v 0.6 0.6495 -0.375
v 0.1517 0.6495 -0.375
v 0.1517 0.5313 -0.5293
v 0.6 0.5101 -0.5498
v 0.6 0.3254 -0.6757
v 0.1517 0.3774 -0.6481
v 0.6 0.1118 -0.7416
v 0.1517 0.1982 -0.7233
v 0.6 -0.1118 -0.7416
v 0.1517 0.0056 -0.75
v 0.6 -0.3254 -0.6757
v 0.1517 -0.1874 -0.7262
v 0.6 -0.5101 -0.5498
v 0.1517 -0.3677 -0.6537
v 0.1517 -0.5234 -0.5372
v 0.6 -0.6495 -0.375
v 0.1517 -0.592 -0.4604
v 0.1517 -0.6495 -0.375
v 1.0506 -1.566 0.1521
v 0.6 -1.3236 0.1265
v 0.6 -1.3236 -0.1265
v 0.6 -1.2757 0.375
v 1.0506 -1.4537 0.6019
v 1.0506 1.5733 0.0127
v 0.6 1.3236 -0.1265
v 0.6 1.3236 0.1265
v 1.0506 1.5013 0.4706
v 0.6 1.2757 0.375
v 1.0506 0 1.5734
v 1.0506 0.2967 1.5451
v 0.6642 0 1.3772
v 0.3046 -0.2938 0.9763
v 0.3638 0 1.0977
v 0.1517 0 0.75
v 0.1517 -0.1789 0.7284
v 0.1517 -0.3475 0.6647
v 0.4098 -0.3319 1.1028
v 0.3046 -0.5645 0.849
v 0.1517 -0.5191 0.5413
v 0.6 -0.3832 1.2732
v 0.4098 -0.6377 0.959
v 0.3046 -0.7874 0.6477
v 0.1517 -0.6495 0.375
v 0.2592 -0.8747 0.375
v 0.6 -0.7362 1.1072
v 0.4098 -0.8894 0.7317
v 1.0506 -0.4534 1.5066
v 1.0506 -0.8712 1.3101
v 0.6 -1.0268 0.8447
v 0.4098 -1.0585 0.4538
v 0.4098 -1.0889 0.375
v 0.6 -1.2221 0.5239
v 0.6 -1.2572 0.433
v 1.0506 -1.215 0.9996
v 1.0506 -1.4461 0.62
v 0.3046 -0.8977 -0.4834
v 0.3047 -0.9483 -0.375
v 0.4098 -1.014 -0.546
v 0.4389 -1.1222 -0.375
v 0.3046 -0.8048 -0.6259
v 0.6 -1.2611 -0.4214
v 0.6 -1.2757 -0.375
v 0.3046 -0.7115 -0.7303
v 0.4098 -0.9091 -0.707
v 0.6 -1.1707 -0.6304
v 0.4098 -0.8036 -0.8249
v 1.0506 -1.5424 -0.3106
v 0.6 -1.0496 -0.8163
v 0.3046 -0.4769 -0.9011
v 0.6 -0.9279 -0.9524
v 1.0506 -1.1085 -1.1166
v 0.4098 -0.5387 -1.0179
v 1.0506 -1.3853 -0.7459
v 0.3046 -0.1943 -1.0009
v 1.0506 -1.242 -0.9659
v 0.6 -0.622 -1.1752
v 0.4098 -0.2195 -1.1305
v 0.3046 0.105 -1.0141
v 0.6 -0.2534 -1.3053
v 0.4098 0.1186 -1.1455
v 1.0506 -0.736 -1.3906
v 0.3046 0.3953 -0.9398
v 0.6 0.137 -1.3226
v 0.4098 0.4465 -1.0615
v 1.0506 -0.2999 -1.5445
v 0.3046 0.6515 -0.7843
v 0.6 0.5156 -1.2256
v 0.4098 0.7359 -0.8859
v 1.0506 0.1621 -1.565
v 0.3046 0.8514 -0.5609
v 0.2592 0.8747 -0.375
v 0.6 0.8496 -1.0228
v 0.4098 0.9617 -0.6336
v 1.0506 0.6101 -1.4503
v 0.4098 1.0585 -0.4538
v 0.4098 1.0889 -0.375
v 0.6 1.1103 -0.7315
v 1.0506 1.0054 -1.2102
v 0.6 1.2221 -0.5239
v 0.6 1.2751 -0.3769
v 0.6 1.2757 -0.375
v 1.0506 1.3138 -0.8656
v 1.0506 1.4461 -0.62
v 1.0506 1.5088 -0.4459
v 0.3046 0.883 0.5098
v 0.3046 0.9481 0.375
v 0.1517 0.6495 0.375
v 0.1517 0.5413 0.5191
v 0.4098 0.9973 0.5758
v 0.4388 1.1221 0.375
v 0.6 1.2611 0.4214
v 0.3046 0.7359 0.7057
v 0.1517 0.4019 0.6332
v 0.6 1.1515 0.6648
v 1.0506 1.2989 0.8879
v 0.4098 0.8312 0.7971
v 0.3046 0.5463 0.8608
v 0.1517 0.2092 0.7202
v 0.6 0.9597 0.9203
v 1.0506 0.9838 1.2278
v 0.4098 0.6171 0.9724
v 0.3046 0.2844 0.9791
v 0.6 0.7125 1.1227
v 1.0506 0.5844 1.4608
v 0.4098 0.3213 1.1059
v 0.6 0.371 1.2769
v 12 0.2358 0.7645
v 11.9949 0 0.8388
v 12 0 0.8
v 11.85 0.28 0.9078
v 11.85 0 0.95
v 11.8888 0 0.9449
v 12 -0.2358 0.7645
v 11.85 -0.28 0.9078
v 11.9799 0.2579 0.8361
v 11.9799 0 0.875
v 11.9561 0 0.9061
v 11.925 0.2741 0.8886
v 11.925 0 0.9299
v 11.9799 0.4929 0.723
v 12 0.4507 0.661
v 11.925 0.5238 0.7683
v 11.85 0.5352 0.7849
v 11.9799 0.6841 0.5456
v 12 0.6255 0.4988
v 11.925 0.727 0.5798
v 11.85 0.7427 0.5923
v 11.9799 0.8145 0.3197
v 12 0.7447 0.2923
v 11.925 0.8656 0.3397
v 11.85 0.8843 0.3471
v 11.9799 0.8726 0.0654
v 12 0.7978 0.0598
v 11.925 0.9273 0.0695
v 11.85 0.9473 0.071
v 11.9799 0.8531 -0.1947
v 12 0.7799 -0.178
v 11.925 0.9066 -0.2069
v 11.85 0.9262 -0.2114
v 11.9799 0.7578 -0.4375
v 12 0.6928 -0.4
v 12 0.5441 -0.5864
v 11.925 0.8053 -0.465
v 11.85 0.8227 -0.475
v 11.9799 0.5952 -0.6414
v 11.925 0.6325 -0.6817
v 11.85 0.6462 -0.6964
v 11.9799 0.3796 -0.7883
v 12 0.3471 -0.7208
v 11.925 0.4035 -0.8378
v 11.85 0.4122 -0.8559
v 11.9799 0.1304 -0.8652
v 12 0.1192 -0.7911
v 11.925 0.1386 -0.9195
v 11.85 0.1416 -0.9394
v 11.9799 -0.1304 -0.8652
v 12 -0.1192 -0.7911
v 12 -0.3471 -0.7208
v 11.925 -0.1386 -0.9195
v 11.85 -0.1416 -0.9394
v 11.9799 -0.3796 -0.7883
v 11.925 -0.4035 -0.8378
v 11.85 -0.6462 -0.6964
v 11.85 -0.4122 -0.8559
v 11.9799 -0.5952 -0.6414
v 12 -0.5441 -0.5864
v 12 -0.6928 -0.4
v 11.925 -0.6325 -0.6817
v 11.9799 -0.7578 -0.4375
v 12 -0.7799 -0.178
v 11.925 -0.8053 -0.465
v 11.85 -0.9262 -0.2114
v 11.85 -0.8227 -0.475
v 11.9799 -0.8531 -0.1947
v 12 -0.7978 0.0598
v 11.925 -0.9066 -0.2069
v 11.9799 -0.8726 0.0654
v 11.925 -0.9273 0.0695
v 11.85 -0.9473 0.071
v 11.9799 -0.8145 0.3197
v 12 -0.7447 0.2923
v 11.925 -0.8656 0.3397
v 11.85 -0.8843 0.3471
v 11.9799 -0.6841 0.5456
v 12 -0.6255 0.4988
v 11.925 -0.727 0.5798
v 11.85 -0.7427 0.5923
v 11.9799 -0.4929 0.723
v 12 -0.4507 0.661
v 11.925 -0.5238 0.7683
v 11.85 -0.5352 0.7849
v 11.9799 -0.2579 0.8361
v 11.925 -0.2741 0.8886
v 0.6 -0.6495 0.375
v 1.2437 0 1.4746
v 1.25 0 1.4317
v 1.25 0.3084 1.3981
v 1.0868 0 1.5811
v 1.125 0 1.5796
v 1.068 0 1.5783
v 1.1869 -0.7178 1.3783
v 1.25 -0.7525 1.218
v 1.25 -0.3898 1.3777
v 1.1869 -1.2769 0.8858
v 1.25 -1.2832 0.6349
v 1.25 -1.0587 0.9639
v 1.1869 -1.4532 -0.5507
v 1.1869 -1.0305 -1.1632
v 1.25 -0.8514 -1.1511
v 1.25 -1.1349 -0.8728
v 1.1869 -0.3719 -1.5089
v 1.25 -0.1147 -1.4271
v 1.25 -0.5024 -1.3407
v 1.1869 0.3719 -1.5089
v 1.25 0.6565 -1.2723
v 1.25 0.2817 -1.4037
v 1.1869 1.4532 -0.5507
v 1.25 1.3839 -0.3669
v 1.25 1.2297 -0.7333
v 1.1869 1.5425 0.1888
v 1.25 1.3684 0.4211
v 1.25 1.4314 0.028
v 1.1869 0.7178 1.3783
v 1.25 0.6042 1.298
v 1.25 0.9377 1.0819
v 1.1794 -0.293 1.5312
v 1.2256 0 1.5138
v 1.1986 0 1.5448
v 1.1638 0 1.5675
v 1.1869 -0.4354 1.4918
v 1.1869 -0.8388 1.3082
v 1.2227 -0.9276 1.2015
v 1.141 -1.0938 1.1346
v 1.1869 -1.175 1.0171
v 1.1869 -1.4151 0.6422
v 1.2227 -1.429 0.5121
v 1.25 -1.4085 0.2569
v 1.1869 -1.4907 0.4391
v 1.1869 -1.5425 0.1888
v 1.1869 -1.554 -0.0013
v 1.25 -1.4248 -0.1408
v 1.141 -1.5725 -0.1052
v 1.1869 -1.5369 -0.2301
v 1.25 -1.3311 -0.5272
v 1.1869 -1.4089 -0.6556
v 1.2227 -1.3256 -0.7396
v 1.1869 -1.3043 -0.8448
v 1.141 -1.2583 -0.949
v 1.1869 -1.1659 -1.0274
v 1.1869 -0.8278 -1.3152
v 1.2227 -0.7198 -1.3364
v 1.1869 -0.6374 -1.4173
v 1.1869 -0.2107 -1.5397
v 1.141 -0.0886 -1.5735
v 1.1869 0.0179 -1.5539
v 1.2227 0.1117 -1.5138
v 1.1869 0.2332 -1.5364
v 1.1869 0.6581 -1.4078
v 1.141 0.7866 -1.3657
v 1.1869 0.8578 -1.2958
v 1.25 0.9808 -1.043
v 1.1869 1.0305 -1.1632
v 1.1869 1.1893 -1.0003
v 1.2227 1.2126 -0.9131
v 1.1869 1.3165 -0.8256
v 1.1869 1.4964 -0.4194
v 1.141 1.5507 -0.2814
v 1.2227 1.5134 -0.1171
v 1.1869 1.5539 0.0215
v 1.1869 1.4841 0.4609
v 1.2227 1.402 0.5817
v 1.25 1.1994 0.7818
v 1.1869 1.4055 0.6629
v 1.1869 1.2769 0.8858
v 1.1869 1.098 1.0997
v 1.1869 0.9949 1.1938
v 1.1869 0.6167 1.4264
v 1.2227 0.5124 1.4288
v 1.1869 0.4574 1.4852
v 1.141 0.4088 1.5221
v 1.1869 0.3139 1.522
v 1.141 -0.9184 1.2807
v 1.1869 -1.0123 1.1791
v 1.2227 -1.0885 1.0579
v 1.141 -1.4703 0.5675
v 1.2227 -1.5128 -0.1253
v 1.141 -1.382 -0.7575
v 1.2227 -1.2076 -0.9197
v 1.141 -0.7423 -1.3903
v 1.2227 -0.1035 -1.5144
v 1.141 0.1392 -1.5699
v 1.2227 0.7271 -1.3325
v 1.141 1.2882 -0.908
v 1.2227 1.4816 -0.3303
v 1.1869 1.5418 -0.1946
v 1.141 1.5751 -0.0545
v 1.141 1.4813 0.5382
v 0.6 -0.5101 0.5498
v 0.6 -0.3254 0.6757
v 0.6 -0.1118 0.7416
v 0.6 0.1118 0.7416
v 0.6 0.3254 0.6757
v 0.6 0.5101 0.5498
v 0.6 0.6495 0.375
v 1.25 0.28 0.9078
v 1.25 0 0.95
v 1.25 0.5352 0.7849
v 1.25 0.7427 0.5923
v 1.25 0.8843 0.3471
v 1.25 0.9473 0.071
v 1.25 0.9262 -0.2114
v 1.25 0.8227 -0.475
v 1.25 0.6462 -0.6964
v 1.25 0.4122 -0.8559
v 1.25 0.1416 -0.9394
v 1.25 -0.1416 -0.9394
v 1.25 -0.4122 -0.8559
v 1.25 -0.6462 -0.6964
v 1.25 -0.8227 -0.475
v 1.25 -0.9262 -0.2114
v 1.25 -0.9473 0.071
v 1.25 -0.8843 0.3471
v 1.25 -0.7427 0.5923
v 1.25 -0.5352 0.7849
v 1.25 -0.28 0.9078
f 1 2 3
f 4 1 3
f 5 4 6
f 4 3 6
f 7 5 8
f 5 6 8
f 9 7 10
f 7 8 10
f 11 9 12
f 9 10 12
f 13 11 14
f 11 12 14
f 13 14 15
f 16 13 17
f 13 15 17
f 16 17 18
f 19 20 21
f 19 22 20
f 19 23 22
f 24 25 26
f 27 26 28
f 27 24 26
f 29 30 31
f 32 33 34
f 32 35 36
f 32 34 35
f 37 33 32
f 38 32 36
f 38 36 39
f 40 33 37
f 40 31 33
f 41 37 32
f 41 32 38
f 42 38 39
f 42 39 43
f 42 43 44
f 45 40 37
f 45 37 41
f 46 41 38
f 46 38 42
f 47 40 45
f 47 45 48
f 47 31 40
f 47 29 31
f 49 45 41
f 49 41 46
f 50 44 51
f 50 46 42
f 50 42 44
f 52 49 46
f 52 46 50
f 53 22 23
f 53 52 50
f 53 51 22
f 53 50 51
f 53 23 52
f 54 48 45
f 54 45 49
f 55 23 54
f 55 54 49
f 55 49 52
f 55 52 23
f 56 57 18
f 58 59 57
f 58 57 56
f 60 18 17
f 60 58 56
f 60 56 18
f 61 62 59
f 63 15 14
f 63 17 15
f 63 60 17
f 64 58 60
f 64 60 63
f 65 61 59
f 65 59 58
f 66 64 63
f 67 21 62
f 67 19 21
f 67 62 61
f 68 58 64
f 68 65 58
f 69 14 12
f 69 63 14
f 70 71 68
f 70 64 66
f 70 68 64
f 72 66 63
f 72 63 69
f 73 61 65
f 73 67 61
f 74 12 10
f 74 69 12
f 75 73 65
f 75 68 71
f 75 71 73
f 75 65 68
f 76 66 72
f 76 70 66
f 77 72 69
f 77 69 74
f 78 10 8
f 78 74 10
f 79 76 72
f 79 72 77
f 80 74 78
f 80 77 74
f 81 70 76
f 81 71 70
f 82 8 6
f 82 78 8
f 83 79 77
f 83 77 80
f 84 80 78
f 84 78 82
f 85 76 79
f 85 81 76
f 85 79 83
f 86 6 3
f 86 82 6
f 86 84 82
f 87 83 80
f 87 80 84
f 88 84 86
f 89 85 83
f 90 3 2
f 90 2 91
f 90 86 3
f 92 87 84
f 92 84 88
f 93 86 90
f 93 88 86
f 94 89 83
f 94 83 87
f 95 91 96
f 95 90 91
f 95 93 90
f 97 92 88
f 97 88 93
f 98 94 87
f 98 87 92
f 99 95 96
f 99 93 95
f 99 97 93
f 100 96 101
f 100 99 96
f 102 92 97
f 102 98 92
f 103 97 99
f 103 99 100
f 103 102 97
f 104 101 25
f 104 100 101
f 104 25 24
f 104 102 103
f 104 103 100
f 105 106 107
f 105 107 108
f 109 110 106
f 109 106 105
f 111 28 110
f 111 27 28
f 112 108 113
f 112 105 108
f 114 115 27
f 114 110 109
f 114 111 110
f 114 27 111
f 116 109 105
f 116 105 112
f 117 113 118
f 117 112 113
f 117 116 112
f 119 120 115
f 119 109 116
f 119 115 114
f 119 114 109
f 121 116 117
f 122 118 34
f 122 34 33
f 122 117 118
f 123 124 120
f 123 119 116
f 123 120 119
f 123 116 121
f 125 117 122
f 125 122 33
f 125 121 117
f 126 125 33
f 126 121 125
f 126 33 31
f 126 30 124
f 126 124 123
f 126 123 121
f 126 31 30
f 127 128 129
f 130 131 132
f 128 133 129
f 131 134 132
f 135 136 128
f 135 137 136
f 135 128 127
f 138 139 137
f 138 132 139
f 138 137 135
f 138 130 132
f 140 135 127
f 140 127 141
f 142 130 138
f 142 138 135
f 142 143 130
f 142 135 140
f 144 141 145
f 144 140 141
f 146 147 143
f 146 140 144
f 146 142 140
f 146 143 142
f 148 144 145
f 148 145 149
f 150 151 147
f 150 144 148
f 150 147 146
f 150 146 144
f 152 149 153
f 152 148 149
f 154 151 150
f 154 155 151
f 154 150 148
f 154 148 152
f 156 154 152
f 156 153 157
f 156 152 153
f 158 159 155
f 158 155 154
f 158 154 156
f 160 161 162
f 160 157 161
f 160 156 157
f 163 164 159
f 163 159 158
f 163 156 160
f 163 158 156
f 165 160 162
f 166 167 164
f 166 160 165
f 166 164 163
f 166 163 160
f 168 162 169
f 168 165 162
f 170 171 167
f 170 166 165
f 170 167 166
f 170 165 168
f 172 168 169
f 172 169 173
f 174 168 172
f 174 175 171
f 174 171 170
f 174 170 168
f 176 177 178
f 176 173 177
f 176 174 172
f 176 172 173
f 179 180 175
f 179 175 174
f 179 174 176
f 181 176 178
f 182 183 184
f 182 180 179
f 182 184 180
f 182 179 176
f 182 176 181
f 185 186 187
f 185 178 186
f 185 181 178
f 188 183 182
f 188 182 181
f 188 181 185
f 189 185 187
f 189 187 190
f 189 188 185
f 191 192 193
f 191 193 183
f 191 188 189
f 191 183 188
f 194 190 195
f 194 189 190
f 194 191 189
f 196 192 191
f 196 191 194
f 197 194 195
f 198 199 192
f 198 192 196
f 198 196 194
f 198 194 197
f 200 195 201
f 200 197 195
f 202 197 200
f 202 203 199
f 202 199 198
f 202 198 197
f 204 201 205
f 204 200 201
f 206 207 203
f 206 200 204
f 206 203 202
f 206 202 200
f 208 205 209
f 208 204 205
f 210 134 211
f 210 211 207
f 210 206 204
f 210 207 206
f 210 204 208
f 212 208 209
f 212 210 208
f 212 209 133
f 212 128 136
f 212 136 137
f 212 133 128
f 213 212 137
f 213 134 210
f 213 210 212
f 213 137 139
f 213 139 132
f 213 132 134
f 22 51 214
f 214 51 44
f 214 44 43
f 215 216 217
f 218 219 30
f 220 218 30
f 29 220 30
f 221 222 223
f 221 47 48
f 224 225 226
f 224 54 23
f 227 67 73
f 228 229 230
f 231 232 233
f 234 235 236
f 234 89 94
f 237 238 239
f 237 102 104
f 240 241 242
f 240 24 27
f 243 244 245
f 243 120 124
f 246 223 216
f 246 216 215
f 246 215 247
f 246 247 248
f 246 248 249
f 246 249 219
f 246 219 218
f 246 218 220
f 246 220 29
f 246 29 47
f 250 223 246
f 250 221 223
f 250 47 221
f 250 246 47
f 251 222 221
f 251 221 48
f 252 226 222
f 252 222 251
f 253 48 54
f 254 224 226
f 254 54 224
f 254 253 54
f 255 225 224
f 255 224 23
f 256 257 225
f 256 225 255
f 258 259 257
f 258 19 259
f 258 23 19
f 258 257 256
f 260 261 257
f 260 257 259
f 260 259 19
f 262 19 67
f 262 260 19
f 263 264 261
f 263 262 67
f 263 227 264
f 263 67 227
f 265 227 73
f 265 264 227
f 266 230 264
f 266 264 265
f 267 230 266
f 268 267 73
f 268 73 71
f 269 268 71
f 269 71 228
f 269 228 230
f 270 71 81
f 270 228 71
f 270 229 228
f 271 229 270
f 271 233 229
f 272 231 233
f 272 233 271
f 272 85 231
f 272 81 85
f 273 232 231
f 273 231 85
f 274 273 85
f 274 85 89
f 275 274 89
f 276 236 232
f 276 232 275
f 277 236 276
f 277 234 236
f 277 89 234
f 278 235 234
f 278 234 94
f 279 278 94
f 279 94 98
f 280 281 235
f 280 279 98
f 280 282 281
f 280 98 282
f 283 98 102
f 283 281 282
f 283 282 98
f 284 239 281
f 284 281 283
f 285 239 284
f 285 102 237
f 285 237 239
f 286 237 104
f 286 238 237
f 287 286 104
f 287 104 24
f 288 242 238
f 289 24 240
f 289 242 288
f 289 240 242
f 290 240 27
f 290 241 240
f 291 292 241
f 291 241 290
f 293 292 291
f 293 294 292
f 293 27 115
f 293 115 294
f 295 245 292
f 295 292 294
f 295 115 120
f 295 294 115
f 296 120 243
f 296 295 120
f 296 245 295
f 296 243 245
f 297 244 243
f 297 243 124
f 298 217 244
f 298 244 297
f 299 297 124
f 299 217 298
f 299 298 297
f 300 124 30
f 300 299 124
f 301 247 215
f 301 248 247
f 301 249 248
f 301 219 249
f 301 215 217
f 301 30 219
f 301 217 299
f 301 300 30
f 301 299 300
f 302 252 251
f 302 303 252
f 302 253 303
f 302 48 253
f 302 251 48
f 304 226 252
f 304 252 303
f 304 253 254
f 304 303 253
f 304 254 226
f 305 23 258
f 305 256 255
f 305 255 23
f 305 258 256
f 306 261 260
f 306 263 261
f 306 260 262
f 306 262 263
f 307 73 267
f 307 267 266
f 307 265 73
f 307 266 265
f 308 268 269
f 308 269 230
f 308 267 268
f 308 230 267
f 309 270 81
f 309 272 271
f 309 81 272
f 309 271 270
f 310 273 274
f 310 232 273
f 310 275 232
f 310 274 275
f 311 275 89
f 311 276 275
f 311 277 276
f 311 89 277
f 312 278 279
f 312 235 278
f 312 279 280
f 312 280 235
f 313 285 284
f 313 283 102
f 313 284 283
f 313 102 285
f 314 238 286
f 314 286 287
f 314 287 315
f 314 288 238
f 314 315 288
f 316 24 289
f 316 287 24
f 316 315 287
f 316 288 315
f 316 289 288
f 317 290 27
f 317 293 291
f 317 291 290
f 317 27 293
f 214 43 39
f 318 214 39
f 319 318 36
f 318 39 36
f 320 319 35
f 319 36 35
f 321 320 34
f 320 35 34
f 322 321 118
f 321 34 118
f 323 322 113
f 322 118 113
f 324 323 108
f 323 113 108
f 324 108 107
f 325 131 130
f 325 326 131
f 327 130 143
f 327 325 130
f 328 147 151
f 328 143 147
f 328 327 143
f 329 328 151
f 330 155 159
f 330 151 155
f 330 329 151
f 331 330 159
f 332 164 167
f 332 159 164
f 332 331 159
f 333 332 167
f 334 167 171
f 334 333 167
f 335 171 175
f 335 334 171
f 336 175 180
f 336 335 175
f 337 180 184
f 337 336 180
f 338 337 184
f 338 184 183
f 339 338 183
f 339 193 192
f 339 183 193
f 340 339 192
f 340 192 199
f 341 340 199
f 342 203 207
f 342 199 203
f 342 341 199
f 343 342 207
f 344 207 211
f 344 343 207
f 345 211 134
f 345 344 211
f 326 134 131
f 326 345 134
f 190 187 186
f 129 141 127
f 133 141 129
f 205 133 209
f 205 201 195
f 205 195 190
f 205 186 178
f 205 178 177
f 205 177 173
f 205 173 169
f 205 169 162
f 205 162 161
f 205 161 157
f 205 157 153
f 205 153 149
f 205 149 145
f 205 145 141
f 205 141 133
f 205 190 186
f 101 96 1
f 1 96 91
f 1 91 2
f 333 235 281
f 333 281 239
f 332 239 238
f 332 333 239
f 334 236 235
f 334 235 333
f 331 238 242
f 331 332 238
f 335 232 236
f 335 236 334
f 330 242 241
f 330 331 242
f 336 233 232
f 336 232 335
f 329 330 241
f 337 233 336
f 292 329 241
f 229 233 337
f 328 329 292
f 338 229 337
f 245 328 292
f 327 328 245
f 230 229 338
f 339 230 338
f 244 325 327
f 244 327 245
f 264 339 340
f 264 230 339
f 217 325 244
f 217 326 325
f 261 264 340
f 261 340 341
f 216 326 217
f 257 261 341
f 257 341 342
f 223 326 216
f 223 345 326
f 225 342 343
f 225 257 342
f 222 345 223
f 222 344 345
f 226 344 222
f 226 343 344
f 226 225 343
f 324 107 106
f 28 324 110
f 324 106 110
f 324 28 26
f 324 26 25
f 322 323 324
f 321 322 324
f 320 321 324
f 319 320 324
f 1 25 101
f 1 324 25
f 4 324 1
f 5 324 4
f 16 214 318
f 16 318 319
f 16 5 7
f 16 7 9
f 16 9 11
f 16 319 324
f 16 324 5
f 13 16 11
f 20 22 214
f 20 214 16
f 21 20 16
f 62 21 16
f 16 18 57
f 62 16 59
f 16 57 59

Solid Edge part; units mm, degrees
sketch "Sketch1" plane through (0, 0, 0) normal (0, -1, 0) x (1, 0, 0)
  line L0 (12, 0) -> (12, 0.95)
  line L1 (12, 0.95) -> (1.25, 0.95)
  line L2 (1.25, 1.63) -> (1.25, 0.95)
  spline S0 degree 3 poles (0, 0) (0, 0.7831) (0.4356, 1.448) (1.25, 1.63) knots 0 0 0 0 1 1 1 1
revolve "RevolvedProtrusion1" add sketch "Sketch1" angle 360 about axis through (0, 0, 0) along (1, 0, 0)
sketch "Sketch2" plane through (0, 0, 0) normal (1, 0, 0) x (0, 0, 1)
  line L0 (-0.375, 1.9976) -> (0.375, 1.9976)
  line L1 (0.375, 1.9976) -> (0.375, 0.6495)
  arc A0 (0.375, 0.6495) -> (0.375, -0.6495) centre (0, 0) cw
  line L2 (0.375, -0.6495) -> (0.375, -1.9976)
  line L3 (0.375, -1.9976) -> (-0.375, -1.9976)
  line L4 (-0.375, -1.9976) -> (-0.375, -0.6495)
  line L5 (-0.375, 0.6495) -> (-0.375, 1.9976)
  arc A1 (-0.375, -0.6495) -> (-0.375, 0.6495) centre (0, 0) cw
extrude "Cutout1" cut sketch "Sketch2" along normal blind 0.6
fillet "Round_1" radius 0.15 2 edges at (12, 0, -0.95) (1.25, 0, -1.63)
properties material "Galvanized steel"
